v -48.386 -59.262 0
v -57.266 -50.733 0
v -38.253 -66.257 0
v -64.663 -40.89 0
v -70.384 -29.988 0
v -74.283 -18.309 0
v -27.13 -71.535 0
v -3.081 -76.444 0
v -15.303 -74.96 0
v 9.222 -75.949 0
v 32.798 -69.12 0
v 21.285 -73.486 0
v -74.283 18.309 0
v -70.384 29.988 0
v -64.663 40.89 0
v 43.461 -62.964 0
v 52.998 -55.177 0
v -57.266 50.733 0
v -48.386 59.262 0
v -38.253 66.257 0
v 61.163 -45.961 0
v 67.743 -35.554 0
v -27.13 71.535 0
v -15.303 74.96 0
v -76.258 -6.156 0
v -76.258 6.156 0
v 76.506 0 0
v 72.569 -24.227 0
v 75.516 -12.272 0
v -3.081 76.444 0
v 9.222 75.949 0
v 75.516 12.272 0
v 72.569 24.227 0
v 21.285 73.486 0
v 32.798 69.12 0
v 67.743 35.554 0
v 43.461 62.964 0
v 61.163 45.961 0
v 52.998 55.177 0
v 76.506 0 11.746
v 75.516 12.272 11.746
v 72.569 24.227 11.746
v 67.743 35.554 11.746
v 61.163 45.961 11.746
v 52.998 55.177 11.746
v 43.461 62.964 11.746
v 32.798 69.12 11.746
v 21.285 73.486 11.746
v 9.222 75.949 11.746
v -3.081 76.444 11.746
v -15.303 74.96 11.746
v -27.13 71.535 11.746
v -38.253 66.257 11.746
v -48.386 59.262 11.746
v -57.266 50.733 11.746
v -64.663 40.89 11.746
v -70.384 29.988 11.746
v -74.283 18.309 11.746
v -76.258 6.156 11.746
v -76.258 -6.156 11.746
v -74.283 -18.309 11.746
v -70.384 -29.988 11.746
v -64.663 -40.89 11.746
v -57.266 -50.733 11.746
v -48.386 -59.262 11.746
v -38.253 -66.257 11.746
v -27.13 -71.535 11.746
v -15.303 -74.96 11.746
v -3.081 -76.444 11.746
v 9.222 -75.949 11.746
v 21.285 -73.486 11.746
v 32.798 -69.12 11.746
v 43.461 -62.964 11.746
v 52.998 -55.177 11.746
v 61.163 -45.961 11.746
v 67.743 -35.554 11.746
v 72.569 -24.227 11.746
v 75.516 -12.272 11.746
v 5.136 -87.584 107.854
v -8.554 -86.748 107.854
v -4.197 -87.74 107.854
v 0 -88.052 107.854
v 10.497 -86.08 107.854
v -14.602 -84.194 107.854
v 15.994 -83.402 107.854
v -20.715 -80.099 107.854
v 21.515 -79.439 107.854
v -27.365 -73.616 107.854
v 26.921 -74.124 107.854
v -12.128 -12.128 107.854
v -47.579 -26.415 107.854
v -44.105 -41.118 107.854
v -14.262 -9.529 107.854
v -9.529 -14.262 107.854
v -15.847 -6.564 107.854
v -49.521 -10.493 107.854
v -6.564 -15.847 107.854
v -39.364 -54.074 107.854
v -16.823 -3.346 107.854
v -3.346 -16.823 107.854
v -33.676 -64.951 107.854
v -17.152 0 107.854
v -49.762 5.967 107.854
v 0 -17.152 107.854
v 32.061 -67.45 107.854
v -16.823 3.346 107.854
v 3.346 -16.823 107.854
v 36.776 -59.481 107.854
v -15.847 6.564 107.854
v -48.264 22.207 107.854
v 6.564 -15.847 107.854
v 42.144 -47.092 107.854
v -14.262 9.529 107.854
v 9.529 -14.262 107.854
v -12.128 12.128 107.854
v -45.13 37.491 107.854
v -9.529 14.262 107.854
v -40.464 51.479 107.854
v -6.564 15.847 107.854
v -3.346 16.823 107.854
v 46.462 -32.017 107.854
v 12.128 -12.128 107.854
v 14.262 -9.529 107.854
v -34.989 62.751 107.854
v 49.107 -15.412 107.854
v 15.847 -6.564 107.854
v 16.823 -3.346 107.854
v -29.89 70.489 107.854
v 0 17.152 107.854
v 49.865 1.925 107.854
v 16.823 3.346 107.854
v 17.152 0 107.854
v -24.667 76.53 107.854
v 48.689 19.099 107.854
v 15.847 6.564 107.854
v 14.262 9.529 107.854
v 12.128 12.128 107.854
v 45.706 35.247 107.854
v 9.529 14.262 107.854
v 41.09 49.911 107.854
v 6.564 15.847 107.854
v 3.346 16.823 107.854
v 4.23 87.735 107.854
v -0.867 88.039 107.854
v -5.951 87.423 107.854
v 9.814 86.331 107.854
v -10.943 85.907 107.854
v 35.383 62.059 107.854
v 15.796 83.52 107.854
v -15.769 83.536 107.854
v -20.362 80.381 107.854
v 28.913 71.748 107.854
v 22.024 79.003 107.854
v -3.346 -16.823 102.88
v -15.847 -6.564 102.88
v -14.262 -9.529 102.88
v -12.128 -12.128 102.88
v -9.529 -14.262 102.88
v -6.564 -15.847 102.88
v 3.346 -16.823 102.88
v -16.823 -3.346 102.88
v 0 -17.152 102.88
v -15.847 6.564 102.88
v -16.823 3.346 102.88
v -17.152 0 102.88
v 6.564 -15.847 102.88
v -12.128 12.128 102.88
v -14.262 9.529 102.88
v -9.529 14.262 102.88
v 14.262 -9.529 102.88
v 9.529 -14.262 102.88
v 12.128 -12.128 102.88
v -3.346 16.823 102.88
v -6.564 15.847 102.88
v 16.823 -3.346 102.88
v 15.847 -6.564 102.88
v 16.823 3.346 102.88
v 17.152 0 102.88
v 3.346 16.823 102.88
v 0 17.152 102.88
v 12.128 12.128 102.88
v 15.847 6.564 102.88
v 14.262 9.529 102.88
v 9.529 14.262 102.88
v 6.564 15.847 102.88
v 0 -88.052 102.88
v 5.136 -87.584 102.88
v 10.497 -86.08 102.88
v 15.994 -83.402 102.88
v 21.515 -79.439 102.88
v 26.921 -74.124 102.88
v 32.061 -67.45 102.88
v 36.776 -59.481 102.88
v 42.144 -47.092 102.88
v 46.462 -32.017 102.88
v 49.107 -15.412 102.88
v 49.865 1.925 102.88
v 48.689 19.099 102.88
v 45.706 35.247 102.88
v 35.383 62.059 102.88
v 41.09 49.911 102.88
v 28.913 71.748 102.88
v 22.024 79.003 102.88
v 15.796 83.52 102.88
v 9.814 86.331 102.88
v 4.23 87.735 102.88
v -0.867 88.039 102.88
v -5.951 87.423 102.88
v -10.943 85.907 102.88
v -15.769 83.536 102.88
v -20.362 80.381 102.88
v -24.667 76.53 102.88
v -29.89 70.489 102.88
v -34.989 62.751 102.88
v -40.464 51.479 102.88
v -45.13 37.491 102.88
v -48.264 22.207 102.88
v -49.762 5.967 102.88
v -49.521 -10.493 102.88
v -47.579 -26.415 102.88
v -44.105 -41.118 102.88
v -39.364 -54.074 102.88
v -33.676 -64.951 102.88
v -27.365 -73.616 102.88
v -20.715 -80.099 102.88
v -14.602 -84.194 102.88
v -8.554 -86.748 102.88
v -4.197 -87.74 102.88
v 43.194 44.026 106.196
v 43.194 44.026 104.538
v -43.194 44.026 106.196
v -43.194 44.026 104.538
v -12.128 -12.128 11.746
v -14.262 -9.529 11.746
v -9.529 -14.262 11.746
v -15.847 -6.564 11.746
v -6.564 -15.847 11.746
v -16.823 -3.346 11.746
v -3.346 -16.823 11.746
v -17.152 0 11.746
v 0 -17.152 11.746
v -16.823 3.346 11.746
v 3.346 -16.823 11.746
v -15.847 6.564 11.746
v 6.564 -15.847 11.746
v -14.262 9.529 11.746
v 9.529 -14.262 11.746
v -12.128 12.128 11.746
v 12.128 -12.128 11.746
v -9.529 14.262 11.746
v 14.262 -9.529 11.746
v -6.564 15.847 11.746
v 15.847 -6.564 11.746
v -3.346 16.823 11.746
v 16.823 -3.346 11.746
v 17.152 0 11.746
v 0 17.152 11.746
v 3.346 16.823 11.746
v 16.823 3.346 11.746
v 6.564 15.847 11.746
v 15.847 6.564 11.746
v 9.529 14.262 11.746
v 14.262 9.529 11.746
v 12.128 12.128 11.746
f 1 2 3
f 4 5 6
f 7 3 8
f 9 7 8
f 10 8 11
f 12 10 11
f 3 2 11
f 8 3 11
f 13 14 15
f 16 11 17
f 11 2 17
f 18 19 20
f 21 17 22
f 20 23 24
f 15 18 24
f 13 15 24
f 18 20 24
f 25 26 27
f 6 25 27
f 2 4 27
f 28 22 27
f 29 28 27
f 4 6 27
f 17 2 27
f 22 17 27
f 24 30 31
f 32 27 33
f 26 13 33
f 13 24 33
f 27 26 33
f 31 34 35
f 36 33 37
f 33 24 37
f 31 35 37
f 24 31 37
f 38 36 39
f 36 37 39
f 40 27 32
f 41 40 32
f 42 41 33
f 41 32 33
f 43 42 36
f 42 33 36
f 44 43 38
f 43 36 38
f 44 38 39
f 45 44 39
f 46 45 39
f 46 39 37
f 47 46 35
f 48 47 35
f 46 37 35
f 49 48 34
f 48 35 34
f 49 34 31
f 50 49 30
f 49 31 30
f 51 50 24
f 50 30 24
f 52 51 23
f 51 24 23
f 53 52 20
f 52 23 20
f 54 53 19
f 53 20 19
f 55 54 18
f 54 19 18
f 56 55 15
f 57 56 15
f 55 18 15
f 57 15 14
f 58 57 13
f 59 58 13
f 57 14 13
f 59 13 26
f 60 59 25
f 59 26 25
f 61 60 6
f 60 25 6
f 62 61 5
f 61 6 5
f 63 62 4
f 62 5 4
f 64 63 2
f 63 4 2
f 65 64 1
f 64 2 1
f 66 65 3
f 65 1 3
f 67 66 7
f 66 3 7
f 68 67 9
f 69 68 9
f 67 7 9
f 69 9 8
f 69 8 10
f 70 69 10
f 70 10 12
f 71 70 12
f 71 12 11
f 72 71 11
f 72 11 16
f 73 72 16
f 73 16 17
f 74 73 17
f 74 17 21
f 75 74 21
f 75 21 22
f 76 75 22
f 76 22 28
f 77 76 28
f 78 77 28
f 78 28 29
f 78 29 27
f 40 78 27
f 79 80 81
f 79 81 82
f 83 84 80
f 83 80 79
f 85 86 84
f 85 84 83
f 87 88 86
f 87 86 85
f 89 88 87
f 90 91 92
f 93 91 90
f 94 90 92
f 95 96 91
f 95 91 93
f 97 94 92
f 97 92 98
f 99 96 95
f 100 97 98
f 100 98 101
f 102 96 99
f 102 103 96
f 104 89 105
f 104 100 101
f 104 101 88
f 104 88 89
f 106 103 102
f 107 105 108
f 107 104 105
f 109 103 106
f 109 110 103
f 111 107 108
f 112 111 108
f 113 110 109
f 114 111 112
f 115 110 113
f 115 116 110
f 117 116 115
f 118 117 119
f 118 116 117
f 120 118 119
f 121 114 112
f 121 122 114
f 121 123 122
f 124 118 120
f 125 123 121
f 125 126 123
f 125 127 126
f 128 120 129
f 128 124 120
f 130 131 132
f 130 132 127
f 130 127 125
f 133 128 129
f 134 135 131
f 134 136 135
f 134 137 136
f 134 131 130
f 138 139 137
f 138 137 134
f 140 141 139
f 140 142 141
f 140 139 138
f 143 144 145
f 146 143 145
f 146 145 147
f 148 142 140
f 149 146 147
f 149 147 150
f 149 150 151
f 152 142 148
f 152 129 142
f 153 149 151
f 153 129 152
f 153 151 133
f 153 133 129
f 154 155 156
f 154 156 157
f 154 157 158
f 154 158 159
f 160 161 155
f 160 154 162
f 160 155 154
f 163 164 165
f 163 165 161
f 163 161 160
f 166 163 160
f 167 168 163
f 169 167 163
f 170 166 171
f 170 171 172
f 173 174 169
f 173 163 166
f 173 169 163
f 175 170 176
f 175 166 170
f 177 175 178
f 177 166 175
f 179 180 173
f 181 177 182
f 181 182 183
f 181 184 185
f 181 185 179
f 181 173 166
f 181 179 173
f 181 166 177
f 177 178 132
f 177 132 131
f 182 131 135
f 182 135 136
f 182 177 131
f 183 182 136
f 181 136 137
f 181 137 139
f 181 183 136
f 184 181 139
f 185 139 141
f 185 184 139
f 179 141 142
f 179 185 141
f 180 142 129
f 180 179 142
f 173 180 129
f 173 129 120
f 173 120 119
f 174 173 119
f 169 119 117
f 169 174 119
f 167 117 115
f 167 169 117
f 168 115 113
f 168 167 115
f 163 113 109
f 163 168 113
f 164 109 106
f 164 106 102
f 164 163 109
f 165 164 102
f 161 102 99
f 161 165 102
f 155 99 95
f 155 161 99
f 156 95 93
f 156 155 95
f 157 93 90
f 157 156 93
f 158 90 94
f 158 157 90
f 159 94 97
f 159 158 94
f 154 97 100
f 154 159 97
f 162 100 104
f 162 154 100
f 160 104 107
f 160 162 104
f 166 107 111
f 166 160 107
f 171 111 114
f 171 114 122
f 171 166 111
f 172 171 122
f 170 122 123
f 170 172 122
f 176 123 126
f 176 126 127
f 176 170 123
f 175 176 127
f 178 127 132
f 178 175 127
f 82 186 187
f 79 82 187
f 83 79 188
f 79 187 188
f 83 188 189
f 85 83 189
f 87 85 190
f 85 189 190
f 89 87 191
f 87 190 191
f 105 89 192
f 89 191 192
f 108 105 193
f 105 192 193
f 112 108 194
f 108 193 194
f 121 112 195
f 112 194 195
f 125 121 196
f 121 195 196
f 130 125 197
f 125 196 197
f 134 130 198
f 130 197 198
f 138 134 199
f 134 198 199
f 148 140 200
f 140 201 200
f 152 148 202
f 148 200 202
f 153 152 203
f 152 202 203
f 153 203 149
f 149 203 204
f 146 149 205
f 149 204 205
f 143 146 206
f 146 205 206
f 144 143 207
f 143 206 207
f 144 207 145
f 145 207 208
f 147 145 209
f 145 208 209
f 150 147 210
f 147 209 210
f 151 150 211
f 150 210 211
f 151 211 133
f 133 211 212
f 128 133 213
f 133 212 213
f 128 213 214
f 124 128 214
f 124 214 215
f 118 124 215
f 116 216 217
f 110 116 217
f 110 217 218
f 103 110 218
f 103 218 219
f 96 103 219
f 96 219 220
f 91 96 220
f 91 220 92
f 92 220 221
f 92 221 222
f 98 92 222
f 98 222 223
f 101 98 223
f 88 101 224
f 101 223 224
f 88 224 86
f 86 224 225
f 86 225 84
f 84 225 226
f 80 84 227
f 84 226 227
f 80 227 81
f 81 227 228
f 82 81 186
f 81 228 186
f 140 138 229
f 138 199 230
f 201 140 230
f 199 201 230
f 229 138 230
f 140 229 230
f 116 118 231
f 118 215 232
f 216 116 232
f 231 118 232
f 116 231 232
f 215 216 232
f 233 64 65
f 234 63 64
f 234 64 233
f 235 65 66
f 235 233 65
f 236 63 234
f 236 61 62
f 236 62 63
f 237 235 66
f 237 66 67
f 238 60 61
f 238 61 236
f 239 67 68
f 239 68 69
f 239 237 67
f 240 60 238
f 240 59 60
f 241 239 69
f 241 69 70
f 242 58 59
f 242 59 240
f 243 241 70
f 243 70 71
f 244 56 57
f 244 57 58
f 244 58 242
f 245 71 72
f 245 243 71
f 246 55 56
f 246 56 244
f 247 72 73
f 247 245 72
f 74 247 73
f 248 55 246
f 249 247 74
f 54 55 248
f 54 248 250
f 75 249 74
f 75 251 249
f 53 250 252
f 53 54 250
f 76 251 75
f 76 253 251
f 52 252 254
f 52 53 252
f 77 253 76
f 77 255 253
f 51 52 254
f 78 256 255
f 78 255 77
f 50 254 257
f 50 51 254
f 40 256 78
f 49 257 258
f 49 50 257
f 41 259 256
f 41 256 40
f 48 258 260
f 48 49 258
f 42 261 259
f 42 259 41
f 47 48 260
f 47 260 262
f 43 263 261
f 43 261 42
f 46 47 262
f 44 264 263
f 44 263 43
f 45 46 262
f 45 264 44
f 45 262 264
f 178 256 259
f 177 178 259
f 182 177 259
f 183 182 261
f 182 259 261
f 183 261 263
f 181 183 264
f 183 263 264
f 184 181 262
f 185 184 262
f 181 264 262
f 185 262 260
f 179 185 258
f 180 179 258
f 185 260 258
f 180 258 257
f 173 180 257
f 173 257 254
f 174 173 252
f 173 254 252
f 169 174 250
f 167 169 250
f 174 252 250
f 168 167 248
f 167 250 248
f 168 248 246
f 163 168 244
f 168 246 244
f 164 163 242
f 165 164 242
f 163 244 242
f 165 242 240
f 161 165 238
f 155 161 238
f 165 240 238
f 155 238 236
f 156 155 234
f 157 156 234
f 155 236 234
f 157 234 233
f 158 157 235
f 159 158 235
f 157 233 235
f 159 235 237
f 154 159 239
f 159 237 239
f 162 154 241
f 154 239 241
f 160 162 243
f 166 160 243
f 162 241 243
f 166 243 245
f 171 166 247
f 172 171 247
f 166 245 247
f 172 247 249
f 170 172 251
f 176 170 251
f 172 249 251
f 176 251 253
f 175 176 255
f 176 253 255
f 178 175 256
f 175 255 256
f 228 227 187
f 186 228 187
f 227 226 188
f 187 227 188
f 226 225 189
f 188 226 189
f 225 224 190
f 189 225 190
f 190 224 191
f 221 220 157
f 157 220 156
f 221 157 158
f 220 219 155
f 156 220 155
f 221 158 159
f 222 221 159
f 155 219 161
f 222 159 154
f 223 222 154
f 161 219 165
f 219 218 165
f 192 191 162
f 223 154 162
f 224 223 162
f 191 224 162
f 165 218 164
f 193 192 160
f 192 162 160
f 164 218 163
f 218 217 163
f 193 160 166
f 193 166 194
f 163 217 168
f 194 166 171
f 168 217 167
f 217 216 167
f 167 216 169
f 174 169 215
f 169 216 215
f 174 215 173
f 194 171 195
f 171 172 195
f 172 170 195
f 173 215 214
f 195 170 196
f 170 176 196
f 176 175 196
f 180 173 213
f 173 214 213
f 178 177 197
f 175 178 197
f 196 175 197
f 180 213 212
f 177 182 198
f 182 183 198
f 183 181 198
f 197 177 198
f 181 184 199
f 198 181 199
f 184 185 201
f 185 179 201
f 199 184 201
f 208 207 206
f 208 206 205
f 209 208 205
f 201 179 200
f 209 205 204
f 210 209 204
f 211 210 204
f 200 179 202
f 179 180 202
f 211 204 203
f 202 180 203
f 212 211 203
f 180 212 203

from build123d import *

# Parameters (mm, degrees)
F0_R     = 76.506459
F1_DEPTH = 11.745617
F2_R     = 17.152233
F3_DEPTH = 91.134138
F5_R     = 17.152233
F6_DEPTH = 4.973829


with BuildPart() as f1:
    # F0 (on Top) → F1 (new body)
    with BuildSketch(Plane.XY):
        Circle(F0_R)
    extrude(amount=F1_DEPTH)

    # F2 (on face) → F3 (join)
    with BuildSketch(Plane.XY.offset(11.745617)):
        Circle(F2_R)
    extrude(amount=F3_DEPTH)


with BuildPart() as f6:
    # F5 (on face) → F6 (new body)
    with BuildSketch(Plane.XY.offset(102.879755)):
        with BuildLine():
            add(Edge.make_bspline(
                [(0, -88.052452), (86.388621, -88.052452), (43.19431, 44.026226), (0, 176.104903), (-43.19431, 44.026226), (-86.388621, -88.052452), (0, -88.052452)],
                knots=[0, 0, 0, 2.094395, 2.094395, 4.18879, 4.18879, 6.283185, 6.283185, 6.283185], degree=2, weights=[1, 0.5, 1, 0.5, 1, 0.5, 1]))
        make_face()
        Circle(F5_R, mode=Mode.SUBTRACT)
    extrude(amount=F6_DEPTH)


solid = Compound([f1.part, f6.part])
